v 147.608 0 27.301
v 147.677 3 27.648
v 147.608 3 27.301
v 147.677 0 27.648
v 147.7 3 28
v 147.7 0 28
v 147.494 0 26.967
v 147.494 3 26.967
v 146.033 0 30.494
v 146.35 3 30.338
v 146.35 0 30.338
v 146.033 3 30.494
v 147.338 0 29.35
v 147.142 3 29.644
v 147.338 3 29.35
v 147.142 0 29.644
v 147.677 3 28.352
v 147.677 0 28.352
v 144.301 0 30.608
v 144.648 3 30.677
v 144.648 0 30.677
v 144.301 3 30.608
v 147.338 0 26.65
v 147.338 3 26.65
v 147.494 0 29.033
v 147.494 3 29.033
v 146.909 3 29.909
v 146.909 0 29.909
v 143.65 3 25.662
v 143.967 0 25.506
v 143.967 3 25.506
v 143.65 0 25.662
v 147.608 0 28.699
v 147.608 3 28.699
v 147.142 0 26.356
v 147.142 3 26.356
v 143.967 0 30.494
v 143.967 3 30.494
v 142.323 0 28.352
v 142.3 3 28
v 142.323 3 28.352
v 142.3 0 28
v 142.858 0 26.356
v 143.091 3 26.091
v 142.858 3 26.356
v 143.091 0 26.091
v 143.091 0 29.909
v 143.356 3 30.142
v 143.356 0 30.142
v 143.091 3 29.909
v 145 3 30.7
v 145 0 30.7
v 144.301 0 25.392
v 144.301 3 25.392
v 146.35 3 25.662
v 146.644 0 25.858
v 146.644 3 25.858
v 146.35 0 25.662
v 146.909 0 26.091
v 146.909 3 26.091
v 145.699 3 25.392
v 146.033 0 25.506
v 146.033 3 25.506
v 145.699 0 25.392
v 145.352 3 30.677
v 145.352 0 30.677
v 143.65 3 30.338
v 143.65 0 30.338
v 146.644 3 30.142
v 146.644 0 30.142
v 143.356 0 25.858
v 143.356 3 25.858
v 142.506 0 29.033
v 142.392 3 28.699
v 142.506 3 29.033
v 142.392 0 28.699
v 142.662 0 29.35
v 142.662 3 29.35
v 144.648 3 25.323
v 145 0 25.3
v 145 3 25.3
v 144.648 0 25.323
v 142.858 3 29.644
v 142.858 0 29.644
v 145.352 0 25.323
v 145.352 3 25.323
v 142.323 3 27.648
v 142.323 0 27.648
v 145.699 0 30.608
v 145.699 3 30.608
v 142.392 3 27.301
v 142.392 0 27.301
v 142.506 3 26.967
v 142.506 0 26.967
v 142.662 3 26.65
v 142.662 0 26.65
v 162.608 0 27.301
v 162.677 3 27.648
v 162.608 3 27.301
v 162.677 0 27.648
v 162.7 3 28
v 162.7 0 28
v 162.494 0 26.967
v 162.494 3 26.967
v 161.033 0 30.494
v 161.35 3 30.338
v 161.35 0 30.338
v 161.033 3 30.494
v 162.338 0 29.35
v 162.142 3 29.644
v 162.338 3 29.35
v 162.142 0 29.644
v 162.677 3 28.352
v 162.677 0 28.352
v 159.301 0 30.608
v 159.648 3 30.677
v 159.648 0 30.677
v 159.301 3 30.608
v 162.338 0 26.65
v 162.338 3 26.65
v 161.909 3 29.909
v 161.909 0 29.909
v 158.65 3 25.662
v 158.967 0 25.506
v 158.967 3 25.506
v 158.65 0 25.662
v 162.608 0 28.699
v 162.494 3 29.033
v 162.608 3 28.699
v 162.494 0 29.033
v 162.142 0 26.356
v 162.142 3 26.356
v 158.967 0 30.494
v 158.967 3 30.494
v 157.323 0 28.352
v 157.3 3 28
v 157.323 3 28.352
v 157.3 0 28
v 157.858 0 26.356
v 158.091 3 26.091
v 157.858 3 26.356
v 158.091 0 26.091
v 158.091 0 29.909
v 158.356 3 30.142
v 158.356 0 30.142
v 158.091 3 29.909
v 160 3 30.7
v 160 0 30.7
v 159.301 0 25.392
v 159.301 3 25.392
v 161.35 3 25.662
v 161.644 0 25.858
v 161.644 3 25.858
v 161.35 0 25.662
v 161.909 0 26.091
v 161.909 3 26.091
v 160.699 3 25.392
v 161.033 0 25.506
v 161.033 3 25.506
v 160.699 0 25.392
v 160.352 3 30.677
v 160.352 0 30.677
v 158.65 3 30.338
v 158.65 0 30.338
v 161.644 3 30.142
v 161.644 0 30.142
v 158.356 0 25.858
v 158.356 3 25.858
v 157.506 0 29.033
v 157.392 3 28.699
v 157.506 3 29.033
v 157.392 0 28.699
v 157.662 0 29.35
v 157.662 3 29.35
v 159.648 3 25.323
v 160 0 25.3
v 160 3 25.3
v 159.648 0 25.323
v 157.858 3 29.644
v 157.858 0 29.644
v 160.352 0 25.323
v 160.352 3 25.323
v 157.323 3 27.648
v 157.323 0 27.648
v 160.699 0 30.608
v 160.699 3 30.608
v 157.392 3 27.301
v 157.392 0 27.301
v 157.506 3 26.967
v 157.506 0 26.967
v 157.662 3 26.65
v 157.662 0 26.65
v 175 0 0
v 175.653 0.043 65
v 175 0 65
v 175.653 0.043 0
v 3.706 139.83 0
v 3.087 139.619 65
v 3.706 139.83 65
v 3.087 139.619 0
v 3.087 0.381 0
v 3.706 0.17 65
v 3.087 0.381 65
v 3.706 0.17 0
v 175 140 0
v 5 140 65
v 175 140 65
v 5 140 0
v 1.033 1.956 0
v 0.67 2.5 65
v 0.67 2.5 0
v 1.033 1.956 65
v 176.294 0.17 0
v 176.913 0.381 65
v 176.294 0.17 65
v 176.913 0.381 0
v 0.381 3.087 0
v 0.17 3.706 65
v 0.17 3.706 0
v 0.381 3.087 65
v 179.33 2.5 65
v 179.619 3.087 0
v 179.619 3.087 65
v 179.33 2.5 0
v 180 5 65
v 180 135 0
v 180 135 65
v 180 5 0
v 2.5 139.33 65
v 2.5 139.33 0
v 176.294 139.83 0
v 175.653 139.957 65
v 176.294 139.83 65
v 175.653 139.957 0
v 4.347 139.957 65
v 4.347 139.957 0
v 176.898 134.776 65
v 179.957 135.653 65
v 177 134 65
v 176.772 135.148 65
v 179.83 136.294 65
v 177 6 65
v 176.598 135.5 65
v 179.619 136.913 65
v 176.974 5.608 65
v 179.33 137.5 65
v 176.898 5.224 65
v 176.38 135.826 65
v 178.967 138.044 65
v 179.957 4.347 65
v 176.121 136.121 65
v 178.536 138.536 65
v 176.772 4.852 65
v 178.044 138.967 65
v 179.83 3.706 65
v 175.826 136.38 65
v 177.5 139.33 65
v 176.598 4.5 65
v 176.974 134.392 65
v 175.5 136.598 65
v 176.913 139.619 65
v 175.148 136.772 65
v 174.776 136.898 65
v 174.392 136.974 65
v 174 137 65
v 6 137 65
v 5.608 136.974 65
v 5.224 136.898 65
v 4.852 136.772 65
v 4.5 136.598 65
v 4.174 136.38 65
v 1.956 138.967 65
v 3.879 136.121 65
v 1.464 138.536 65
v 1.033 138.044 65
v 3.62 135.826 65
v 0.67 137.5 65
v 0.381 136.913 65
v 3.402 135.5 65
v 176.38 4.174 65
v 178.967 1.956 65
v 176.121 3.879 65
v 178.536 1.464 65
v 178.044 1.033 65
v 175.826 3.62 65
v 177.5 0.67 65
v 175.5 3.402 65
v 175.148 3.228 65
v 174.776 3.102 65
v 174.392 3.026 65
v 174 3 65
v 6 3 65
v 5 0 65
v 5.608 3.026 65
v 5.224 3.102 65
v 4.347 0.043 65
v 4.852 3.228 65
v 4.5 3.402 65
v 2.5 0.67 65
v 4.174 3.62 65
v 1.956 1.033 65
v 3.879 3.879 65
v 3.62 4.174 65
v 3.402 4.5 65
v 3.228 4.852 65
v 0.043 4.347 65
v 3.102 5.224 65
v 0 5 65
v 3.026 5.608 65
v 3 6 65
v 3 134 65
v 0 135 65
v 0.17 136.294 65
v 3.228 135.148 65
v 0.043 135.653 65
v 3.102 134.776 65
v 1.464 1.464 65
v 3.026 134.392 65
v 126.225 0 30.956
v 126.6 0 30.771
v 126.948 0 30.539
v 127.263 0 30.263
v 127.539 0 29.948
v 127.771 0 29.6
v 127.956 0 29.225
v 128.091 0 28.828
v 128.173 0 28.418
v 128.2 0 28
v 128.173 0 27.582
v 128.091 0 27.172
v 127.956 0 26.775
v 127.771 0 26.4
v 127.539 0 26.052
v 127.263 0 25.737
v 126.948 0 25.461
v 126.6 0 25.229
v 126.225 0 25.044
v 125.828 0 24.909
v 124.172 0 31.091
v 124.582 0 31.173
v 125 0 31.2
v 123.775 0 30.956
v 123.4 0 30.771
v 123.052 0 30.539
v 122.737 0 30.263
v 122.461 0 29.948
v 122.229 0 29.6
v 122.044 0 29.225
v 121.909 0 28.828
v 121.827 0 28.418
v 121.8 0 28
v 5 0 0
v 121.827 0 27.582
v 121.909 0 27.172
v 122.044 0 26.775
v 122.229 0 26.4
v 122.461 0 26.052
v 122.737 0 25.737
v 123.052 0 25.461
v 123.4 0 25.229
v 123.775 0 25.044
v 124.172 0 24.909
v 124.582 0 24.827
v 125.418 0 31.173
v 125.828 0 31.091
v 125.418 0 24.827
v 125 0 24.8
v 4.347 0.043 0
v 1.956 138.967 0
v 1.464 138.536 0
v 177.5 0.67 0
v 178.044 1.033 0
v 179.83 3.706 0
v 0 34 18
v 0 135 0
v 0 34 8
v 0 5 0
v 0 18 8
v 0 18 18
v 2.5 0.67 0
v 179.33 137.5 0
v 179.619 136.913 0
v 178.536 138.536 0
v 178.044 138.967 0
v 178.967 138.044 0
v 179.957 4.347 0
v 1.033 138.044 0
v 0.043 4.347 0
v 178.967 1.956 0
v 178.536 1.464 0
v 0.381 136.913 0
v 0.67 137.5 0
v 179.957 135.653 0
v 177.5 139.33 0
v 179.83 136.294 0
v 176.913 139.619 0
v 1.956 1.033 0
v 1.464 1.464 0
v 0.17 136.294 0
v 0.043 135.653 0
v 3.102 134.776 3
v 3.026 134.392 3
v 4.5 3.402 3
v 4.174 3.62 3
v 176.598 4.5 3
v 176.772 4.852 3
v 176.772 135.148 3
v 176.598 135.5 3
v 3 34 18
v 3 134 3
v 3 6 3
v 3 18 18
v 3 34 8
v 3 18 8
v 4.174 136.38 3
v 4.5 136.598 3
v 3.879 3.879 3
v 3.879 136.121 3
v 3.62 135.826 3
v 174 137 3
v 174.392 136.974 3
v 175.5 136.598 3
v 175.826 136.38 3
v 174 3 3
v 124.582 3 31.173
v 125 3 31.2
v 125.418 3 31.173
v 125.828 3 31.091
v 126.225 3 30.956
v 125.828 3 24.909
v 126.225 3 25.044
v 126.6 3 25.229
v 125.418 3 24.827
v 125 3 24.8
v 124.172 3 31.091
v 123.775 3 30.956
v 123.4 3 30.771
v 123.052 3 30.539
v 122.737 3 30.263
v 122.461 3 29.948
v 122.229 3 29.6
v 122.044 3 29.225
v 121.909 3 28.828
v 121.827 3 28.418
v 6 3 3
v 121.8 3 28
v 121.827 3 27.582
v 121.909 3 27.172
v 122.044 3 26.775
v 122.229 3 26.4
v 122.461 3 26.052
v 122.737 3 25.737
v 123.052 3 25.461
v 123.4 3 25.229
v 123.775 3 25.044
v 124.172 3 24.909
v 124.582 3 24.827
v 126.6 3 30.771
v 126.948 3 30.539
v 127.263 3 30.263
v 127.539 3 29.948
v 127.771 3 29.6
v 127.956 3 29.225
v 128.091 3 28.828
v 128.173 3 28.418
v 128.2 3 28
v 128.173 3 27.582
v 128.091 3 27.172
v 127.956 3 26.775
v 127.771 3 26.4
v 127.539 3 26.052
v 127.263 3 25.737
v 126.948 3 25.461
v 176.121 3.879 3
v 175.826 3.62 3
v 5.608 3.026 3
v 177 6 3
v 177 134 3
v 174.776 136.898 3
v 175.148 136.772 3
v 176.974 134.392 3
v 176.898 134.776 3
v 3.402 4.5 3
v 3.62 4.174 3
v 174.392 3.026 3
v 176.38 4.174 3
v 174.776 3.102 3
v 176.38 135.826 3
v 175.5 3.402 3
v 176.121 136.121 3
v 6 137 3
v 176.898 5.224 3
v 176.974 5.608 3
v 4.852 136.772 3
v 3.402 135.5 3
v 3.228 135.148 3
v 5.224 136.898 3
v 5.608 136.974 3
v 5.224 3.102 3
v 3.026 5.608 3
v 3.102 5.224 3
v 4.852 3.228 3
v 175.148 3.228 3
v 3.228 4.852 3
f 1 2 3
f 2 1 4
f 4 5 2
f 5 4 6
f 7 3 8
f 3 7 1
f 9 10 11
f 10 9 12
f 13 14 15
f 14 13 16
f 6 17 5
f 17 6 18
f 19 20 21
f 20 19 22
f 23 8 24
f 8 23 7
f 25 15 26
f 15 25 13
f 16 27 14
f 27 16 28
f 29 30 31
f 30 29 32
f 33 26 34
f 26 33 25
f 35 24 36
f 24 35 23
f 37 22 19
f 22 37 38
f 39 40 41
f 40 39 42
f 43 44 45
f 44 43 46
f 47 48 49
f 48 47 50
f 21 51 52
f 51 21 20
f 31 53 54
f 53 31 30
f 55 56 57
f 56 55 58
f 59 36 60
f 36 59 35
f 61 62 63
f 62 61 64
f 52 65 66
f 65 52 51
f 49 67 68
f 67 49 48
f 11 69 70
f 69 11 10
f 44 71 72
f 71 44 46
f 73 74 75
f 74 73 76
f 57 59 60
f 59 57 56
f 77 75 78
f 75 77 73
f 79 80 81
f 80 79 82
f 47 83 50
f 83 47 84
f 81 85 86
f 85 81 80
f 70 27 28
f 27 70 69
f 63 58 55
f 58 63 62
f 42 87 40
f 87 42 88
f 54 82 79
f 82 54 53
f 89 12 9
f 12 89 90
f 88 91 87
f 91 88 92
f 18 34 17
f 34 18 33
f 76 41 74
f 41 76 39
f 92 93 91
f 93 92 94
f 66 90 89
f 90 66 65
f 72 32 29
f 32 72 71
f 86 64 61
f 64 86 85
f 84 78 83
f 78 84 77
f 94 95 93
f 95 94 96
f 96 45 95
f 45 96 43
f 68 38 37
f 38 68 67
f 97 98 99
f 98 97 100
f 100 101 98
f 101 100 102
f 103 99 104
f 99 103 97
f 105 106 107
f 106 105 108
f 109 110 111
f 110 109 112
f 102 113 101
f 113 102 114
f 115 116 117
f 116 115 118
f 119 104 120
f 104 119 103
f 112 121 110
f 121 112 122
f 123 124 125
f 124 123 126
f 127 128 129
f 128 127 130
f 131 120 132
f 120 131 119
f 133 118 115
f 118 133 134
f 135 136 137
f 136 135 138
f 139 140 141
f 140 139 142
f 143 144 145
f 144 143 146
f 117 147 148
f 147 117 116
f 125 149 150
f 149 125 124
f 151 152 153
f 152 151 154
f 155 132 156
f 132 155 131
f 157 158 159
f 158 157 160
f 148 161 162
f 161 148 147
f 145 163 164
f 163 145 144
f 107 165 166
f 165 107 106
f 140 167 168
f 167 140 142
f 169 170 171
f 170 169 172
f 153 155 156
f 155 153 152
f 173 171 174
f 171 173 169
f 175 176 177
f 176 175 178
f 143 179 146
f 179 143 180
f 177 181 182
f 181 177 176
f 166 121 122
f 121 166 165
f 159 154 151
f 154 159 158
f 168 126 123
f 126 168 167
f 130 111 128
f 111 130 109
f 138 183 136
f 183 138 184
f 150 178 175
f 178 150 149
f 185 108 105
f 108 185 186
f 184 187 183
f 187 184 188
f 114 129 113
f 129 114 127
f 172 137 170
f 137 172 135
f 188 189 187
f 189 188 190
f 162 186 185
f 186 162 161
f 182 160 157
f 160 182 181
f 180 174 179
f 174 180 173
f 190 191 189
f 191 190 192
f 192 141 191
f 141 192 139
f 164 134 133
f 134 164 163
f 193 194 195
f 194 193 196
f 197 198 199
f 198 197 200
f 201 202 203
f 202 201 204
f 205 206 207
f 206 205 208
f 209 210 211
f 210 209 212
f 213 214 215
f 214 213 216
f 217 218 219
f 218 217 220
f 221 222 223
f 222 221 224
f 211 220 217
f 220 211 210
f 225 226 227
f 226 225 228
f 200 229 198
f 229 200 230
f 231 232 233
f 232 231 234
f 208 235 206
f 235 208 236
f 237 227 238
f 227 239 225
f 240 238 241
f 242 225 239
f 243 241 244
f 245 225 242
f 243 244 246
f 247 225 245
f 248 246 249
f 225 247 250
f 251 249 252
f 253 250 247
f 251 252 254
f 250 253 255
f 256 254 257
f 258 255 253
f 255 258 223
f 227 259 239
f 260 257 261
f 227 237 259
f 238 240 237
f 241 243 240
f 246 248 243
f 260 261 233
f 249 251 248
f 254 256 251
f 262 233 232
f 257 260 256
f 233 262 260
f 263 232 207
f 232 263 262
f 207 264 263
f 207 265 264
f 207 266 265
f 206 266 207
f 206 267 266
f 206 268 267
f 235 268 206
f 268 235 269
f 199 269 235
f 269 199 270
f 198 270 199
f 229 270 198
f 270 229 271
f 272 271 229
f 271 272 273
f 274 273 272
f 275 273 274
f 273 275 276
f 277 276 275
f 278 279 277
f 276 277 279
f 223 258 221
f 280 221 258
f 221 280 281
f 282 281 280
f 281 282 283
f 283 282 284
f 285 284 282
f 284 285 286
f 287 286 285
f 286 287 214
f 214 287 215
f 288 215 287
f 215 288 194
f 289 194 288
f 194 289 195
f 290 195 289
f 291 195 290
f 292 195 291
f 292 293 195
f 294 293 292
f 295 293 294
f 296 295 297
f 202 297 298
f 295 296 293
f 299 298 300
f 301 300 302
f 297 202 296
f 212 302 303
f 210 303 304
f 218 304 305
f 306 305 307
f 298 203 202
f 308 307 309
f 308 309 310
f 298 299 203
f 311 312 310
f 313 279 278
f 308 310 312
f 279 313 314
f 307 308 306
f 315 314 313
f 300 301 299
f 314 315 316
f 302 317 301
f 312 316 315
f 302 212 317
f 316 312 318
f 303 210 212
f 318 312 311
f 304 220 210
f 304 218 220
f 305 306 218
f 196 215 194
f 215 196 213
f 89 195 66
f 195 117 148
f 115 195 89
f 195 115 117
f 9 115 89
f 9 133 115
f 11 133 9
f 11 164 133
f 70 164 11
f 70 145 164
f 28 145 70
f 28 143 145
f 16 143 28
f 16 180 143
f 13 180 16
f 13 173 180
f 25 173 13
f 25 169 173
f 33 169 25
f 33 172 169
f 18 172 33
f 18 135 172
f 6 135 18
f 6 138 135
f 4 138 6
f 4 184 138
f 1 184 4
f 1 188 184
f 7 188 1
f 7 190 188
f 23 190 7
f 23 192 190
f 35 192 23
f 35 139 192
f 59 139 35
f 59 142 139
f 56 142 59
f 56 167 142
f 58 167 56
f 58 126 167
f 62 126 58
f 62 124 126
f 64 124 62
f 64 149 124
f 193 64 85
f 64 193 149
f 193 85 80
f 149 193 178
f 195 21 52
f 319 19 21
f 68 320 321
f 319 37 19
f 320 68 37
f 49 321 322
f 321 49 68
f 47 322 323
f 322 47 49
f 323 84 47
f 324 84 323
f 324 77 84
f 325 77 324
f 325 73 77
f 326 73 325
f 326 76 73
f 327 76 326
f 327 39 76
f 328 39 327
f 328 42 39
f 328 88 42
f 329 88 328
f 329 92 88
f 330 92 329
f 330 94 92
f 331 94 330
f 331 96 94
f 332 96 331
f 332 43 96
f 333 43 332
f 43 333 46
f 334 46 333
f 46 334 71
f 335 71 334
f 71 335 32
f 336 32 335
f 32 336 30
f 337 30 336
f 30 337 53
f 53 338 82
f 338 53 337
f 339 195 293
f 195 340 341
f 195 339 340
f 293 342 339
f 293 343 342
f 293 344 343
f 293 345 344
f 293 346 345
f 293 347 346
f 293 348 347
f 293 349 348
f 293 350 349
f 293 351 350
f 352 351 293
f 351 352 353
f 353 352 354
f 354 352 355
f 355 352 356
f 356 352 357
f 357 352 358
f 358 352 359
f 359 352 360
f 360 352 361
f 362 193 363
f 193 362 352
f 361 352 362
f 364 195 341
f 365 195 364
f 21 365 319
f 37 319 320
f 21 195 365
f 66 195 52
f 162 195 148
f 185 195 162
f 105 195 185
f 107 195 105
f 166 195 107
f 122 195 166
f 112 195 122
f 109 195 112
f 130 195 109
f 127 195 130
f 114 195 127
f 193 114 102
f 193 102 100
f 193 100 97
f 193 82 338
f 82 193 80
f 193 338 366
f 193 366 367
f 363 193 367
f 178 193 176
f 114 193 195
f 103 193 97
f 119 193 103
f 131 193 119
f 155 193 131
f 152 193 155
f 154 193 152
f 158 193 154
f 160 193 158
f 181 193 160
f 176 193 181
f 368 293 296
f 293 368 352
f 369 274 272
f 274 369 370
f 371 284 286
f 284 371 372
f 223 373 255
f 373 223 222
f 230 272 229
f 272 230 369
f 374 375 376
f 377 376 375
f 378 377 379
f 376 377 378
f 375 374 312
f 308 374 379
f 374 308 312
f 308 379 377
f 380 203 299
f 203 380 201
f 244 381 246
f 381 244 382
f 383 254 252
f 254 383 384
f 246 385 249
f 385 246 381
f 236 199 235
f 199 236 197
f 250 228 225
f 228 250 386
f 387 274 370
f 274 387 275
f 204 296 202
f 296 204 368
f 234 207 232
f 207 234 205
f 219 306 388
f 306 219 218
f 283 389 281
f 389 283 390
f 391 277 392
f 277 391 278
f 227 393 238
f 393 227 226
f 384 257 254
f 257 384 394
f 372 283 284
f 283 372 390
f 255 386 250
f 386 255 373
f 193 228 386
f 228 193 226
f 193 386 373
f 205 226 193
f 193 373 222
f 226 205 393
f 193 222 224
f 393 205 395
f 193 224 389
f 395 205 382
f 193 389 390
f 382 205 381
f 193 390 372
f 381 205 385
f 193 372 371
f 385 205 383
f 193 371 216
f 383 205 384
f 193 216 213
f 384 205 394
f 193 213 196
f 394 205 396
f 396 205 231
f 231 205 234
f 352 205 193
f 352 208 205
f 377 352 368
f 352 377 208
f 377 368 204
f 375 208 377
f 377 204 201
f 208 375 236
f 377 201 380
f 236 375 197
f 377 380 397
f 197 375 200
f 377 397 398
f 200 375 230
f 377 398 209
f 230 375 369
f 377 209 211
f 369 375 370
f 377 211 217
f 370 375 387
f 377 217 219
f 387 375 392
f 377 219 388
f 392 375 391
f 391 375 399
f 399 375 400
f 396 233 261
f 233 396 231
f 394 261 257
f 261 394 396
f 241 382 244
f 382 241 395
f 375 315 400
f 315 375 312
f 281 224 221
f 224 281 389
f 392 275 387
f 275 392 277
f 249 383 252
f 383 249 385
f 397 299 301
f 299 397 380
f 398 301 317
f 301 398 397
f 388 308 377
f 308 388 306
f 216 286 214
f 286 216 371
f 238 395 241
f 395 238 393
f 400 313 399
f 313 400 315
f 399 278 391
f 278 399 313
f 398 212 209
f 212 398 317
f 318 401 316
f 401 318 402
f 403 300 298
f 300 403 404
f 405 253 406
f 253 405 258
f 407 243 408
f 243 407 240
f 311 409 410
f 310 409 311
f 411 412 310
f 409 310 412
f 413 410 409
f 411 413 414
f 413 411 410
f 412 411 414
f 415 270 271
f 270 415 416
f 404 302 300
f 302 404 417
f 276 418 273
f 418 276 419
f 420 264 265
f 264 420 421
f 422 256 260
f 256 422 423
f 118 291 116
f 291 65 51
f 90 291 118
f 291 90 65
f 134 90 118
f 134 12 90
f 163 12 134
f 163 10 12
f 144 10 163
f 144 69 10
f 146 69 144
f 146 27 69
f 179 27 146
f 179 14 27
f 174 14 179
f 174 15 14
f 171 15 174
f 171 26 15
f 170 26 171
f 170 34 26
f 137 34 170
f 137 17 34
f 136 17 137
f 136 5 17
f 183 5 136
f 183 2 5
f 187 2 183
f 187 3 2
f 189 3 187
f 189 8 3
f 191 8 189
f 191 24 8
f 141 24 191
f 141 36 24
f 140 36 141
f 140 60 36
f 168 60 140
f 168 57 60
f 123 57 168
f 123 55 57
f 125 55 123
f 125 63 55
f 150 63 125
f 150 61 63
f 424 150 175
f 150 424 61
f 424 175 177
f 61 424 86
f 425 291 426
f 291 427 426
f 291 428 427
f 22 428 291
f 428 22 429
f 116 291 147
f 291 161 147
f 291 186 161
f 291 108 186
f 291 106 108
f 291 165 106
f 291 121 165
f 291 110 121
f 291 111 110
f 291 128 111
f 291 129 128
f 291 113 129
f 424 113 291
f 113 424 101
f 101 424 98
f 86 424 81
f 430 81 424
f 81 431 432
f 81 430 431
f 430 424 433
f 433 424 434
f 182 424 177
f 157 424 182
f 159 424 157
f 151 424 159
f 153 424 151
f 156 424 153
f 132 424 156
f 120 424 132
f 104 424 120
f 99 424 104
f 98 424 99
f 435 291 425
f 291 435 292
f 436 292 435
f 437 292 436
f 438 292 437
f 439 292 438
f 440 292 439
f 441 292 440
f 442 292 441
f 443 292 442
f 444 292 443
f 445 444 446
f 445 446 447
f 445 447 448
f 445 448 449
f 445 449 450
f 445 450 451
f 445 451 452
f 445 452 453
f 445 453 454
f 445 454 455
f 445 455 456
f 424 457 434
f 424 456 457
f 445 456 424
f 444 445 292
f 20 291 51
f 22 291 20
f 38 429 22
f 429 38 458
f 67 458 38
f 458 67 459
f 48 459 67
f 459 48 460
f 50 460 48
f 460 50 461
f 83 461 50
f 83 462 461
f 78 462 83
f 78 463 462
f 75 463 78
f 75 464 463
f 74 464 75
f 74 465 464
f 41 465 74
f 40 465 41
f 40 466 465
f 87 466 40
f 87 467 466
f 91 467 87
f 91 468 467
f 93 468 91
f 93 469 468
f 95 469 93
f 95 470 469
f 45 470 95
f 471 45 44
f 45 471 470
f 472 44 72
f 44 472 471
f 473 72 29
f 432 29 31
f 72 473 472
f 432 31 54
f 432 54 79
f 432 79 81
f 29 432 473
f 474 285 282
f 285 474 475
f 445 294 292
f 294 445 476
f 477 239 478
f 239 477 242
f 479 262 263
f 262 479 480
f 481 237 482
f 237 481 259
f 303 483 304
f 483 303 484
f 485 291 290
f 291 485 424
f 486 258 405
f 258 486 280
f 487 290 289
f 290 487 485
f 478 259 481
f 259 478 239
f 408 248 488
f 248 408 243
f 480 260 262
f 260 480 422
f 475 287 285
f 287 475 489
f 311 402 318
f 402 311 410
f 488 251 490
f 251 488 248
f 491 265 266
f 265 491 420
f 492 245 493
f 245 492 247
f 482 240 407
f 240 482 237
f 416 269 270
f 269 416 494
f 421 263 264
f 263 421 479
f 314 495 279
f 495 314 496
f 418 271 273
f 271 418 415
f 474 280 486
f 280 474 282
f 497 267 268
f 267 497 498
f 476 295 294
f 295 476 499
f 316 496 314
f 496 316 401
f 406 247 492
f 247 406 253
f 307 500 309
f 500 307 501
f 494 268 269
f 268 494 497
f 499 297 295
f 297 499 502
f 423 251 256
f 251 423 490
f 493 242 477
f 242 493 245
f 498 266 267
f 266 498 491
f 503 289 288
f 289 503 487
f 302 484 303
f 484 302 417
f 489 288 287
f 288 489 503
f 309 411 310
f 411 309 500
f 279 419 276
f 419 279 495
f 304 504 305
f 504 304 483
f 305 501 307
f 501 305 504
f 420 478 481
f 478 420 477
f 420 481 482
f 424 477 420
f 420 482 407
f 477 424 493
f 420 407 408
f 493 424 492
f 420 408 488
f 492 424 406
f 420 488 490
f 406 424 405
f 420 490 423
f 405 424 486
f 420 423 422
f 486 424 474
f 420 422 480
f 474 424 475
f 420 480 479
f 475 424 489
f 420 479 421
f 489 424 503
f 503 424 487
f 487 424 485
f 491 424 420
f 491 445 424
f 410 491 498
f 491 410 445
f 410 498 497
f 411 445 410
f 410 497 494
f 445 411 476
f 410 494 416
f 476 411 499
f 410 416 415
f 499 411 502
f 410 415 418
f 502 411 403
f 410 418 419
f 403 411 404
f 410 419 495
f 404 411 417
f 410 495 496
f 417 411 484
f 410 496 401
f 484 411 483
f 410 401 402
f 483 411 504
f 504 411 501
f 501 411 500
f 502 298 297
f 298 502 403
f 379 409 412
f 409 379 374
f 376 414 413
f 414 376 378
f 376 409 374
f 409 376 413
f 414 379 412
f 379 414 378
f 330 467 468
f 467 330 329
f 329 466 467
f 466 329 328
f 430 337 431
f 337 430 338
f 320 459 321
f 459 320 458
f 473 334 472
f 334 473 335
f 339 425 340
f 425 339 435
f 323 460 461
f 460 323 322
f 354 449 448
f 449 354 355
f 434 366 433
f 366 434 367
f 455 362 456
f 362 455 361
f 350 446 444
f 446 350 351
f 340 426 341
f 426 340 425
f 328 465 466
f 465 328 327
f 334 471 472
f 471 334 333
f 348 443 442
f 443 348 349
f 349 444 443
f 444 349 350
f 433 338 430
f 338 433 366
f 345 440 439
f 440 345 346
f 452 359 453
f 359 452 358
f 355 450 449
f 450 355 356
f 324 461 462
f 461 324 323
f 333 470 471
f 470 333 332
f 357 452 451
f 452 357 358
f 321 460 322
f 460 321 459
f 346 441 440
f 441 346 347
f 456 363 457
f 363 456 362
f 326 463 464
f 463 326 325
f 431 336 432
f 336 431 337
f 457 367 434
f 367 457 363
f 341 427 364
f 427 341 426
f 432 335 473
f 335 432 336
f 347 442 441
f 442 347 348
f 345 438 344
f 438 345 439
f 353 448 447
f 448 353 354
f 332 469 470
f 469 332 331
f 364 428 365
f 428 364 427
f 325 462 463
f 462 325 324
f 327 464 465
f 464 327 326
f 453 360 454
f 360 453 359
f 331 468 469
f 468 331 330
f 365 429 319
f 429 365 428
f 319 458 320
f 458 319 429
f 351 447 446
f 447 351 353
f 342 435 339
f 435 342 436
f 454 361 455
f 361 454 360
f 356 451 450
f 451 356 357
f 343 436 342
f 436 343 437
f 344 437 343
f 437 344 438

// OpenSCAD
// OdontoRaman Lab | mm | protótipo didático com LED. NÃO é barreira laser.
// Abra no OpenSCAD; selecione part; F6; Exportar STL. Medir placa antes de imprimir.
part = "base"; // [base,tampa,bandeja]
$fn=48;
W=180; D=140; H=65; wall=3;
module roundedbox(w,d,h,r=5){hull()for(x=[r,w-r],y=[r,d-r])translate([x,y,0])cylinder(h=h,r=r);}
module base(){difference(){roundedbox(W,D,H);translate([wall,wall,wall])roundedbox(W-2*wall,D-2*wall,H+1,3);translate([-1,18,8])cube([5,16,10]); // USB universal
 for(x=[145,160])translate([x,-1,28])rotate([-90,0,0])cylinder(h=5,d=5.4); // LED
 translate([125,-1,28])rotate([-90,0,0])cylinder(h=5,d=6.4); // botão de painel/adaptador
 } }
module lid(){difference(){union(){roundedbox(W,D,3);translate([3.4,3.4,3])difference(){roundedbox(W-6.8,D-6.8,3,3);translate([2,2,-.1])roundedbox(W-10.8,D-10.8,3.2,2);}}translate([W/2,D/2,-.1])cylinder(h=3.2,d=5.4);} }
module tray(){difference(){roundedbox(70,55,8,4);translate([35,27.5,3])cylinder(h=6,d=24);for(x=[9,61])translate([x,27.5,-1])cylinder(h=10,d=3.4);}}
if(part=="base")base();if(part=="tampa")lid();if(part=="bandeja")tray();
